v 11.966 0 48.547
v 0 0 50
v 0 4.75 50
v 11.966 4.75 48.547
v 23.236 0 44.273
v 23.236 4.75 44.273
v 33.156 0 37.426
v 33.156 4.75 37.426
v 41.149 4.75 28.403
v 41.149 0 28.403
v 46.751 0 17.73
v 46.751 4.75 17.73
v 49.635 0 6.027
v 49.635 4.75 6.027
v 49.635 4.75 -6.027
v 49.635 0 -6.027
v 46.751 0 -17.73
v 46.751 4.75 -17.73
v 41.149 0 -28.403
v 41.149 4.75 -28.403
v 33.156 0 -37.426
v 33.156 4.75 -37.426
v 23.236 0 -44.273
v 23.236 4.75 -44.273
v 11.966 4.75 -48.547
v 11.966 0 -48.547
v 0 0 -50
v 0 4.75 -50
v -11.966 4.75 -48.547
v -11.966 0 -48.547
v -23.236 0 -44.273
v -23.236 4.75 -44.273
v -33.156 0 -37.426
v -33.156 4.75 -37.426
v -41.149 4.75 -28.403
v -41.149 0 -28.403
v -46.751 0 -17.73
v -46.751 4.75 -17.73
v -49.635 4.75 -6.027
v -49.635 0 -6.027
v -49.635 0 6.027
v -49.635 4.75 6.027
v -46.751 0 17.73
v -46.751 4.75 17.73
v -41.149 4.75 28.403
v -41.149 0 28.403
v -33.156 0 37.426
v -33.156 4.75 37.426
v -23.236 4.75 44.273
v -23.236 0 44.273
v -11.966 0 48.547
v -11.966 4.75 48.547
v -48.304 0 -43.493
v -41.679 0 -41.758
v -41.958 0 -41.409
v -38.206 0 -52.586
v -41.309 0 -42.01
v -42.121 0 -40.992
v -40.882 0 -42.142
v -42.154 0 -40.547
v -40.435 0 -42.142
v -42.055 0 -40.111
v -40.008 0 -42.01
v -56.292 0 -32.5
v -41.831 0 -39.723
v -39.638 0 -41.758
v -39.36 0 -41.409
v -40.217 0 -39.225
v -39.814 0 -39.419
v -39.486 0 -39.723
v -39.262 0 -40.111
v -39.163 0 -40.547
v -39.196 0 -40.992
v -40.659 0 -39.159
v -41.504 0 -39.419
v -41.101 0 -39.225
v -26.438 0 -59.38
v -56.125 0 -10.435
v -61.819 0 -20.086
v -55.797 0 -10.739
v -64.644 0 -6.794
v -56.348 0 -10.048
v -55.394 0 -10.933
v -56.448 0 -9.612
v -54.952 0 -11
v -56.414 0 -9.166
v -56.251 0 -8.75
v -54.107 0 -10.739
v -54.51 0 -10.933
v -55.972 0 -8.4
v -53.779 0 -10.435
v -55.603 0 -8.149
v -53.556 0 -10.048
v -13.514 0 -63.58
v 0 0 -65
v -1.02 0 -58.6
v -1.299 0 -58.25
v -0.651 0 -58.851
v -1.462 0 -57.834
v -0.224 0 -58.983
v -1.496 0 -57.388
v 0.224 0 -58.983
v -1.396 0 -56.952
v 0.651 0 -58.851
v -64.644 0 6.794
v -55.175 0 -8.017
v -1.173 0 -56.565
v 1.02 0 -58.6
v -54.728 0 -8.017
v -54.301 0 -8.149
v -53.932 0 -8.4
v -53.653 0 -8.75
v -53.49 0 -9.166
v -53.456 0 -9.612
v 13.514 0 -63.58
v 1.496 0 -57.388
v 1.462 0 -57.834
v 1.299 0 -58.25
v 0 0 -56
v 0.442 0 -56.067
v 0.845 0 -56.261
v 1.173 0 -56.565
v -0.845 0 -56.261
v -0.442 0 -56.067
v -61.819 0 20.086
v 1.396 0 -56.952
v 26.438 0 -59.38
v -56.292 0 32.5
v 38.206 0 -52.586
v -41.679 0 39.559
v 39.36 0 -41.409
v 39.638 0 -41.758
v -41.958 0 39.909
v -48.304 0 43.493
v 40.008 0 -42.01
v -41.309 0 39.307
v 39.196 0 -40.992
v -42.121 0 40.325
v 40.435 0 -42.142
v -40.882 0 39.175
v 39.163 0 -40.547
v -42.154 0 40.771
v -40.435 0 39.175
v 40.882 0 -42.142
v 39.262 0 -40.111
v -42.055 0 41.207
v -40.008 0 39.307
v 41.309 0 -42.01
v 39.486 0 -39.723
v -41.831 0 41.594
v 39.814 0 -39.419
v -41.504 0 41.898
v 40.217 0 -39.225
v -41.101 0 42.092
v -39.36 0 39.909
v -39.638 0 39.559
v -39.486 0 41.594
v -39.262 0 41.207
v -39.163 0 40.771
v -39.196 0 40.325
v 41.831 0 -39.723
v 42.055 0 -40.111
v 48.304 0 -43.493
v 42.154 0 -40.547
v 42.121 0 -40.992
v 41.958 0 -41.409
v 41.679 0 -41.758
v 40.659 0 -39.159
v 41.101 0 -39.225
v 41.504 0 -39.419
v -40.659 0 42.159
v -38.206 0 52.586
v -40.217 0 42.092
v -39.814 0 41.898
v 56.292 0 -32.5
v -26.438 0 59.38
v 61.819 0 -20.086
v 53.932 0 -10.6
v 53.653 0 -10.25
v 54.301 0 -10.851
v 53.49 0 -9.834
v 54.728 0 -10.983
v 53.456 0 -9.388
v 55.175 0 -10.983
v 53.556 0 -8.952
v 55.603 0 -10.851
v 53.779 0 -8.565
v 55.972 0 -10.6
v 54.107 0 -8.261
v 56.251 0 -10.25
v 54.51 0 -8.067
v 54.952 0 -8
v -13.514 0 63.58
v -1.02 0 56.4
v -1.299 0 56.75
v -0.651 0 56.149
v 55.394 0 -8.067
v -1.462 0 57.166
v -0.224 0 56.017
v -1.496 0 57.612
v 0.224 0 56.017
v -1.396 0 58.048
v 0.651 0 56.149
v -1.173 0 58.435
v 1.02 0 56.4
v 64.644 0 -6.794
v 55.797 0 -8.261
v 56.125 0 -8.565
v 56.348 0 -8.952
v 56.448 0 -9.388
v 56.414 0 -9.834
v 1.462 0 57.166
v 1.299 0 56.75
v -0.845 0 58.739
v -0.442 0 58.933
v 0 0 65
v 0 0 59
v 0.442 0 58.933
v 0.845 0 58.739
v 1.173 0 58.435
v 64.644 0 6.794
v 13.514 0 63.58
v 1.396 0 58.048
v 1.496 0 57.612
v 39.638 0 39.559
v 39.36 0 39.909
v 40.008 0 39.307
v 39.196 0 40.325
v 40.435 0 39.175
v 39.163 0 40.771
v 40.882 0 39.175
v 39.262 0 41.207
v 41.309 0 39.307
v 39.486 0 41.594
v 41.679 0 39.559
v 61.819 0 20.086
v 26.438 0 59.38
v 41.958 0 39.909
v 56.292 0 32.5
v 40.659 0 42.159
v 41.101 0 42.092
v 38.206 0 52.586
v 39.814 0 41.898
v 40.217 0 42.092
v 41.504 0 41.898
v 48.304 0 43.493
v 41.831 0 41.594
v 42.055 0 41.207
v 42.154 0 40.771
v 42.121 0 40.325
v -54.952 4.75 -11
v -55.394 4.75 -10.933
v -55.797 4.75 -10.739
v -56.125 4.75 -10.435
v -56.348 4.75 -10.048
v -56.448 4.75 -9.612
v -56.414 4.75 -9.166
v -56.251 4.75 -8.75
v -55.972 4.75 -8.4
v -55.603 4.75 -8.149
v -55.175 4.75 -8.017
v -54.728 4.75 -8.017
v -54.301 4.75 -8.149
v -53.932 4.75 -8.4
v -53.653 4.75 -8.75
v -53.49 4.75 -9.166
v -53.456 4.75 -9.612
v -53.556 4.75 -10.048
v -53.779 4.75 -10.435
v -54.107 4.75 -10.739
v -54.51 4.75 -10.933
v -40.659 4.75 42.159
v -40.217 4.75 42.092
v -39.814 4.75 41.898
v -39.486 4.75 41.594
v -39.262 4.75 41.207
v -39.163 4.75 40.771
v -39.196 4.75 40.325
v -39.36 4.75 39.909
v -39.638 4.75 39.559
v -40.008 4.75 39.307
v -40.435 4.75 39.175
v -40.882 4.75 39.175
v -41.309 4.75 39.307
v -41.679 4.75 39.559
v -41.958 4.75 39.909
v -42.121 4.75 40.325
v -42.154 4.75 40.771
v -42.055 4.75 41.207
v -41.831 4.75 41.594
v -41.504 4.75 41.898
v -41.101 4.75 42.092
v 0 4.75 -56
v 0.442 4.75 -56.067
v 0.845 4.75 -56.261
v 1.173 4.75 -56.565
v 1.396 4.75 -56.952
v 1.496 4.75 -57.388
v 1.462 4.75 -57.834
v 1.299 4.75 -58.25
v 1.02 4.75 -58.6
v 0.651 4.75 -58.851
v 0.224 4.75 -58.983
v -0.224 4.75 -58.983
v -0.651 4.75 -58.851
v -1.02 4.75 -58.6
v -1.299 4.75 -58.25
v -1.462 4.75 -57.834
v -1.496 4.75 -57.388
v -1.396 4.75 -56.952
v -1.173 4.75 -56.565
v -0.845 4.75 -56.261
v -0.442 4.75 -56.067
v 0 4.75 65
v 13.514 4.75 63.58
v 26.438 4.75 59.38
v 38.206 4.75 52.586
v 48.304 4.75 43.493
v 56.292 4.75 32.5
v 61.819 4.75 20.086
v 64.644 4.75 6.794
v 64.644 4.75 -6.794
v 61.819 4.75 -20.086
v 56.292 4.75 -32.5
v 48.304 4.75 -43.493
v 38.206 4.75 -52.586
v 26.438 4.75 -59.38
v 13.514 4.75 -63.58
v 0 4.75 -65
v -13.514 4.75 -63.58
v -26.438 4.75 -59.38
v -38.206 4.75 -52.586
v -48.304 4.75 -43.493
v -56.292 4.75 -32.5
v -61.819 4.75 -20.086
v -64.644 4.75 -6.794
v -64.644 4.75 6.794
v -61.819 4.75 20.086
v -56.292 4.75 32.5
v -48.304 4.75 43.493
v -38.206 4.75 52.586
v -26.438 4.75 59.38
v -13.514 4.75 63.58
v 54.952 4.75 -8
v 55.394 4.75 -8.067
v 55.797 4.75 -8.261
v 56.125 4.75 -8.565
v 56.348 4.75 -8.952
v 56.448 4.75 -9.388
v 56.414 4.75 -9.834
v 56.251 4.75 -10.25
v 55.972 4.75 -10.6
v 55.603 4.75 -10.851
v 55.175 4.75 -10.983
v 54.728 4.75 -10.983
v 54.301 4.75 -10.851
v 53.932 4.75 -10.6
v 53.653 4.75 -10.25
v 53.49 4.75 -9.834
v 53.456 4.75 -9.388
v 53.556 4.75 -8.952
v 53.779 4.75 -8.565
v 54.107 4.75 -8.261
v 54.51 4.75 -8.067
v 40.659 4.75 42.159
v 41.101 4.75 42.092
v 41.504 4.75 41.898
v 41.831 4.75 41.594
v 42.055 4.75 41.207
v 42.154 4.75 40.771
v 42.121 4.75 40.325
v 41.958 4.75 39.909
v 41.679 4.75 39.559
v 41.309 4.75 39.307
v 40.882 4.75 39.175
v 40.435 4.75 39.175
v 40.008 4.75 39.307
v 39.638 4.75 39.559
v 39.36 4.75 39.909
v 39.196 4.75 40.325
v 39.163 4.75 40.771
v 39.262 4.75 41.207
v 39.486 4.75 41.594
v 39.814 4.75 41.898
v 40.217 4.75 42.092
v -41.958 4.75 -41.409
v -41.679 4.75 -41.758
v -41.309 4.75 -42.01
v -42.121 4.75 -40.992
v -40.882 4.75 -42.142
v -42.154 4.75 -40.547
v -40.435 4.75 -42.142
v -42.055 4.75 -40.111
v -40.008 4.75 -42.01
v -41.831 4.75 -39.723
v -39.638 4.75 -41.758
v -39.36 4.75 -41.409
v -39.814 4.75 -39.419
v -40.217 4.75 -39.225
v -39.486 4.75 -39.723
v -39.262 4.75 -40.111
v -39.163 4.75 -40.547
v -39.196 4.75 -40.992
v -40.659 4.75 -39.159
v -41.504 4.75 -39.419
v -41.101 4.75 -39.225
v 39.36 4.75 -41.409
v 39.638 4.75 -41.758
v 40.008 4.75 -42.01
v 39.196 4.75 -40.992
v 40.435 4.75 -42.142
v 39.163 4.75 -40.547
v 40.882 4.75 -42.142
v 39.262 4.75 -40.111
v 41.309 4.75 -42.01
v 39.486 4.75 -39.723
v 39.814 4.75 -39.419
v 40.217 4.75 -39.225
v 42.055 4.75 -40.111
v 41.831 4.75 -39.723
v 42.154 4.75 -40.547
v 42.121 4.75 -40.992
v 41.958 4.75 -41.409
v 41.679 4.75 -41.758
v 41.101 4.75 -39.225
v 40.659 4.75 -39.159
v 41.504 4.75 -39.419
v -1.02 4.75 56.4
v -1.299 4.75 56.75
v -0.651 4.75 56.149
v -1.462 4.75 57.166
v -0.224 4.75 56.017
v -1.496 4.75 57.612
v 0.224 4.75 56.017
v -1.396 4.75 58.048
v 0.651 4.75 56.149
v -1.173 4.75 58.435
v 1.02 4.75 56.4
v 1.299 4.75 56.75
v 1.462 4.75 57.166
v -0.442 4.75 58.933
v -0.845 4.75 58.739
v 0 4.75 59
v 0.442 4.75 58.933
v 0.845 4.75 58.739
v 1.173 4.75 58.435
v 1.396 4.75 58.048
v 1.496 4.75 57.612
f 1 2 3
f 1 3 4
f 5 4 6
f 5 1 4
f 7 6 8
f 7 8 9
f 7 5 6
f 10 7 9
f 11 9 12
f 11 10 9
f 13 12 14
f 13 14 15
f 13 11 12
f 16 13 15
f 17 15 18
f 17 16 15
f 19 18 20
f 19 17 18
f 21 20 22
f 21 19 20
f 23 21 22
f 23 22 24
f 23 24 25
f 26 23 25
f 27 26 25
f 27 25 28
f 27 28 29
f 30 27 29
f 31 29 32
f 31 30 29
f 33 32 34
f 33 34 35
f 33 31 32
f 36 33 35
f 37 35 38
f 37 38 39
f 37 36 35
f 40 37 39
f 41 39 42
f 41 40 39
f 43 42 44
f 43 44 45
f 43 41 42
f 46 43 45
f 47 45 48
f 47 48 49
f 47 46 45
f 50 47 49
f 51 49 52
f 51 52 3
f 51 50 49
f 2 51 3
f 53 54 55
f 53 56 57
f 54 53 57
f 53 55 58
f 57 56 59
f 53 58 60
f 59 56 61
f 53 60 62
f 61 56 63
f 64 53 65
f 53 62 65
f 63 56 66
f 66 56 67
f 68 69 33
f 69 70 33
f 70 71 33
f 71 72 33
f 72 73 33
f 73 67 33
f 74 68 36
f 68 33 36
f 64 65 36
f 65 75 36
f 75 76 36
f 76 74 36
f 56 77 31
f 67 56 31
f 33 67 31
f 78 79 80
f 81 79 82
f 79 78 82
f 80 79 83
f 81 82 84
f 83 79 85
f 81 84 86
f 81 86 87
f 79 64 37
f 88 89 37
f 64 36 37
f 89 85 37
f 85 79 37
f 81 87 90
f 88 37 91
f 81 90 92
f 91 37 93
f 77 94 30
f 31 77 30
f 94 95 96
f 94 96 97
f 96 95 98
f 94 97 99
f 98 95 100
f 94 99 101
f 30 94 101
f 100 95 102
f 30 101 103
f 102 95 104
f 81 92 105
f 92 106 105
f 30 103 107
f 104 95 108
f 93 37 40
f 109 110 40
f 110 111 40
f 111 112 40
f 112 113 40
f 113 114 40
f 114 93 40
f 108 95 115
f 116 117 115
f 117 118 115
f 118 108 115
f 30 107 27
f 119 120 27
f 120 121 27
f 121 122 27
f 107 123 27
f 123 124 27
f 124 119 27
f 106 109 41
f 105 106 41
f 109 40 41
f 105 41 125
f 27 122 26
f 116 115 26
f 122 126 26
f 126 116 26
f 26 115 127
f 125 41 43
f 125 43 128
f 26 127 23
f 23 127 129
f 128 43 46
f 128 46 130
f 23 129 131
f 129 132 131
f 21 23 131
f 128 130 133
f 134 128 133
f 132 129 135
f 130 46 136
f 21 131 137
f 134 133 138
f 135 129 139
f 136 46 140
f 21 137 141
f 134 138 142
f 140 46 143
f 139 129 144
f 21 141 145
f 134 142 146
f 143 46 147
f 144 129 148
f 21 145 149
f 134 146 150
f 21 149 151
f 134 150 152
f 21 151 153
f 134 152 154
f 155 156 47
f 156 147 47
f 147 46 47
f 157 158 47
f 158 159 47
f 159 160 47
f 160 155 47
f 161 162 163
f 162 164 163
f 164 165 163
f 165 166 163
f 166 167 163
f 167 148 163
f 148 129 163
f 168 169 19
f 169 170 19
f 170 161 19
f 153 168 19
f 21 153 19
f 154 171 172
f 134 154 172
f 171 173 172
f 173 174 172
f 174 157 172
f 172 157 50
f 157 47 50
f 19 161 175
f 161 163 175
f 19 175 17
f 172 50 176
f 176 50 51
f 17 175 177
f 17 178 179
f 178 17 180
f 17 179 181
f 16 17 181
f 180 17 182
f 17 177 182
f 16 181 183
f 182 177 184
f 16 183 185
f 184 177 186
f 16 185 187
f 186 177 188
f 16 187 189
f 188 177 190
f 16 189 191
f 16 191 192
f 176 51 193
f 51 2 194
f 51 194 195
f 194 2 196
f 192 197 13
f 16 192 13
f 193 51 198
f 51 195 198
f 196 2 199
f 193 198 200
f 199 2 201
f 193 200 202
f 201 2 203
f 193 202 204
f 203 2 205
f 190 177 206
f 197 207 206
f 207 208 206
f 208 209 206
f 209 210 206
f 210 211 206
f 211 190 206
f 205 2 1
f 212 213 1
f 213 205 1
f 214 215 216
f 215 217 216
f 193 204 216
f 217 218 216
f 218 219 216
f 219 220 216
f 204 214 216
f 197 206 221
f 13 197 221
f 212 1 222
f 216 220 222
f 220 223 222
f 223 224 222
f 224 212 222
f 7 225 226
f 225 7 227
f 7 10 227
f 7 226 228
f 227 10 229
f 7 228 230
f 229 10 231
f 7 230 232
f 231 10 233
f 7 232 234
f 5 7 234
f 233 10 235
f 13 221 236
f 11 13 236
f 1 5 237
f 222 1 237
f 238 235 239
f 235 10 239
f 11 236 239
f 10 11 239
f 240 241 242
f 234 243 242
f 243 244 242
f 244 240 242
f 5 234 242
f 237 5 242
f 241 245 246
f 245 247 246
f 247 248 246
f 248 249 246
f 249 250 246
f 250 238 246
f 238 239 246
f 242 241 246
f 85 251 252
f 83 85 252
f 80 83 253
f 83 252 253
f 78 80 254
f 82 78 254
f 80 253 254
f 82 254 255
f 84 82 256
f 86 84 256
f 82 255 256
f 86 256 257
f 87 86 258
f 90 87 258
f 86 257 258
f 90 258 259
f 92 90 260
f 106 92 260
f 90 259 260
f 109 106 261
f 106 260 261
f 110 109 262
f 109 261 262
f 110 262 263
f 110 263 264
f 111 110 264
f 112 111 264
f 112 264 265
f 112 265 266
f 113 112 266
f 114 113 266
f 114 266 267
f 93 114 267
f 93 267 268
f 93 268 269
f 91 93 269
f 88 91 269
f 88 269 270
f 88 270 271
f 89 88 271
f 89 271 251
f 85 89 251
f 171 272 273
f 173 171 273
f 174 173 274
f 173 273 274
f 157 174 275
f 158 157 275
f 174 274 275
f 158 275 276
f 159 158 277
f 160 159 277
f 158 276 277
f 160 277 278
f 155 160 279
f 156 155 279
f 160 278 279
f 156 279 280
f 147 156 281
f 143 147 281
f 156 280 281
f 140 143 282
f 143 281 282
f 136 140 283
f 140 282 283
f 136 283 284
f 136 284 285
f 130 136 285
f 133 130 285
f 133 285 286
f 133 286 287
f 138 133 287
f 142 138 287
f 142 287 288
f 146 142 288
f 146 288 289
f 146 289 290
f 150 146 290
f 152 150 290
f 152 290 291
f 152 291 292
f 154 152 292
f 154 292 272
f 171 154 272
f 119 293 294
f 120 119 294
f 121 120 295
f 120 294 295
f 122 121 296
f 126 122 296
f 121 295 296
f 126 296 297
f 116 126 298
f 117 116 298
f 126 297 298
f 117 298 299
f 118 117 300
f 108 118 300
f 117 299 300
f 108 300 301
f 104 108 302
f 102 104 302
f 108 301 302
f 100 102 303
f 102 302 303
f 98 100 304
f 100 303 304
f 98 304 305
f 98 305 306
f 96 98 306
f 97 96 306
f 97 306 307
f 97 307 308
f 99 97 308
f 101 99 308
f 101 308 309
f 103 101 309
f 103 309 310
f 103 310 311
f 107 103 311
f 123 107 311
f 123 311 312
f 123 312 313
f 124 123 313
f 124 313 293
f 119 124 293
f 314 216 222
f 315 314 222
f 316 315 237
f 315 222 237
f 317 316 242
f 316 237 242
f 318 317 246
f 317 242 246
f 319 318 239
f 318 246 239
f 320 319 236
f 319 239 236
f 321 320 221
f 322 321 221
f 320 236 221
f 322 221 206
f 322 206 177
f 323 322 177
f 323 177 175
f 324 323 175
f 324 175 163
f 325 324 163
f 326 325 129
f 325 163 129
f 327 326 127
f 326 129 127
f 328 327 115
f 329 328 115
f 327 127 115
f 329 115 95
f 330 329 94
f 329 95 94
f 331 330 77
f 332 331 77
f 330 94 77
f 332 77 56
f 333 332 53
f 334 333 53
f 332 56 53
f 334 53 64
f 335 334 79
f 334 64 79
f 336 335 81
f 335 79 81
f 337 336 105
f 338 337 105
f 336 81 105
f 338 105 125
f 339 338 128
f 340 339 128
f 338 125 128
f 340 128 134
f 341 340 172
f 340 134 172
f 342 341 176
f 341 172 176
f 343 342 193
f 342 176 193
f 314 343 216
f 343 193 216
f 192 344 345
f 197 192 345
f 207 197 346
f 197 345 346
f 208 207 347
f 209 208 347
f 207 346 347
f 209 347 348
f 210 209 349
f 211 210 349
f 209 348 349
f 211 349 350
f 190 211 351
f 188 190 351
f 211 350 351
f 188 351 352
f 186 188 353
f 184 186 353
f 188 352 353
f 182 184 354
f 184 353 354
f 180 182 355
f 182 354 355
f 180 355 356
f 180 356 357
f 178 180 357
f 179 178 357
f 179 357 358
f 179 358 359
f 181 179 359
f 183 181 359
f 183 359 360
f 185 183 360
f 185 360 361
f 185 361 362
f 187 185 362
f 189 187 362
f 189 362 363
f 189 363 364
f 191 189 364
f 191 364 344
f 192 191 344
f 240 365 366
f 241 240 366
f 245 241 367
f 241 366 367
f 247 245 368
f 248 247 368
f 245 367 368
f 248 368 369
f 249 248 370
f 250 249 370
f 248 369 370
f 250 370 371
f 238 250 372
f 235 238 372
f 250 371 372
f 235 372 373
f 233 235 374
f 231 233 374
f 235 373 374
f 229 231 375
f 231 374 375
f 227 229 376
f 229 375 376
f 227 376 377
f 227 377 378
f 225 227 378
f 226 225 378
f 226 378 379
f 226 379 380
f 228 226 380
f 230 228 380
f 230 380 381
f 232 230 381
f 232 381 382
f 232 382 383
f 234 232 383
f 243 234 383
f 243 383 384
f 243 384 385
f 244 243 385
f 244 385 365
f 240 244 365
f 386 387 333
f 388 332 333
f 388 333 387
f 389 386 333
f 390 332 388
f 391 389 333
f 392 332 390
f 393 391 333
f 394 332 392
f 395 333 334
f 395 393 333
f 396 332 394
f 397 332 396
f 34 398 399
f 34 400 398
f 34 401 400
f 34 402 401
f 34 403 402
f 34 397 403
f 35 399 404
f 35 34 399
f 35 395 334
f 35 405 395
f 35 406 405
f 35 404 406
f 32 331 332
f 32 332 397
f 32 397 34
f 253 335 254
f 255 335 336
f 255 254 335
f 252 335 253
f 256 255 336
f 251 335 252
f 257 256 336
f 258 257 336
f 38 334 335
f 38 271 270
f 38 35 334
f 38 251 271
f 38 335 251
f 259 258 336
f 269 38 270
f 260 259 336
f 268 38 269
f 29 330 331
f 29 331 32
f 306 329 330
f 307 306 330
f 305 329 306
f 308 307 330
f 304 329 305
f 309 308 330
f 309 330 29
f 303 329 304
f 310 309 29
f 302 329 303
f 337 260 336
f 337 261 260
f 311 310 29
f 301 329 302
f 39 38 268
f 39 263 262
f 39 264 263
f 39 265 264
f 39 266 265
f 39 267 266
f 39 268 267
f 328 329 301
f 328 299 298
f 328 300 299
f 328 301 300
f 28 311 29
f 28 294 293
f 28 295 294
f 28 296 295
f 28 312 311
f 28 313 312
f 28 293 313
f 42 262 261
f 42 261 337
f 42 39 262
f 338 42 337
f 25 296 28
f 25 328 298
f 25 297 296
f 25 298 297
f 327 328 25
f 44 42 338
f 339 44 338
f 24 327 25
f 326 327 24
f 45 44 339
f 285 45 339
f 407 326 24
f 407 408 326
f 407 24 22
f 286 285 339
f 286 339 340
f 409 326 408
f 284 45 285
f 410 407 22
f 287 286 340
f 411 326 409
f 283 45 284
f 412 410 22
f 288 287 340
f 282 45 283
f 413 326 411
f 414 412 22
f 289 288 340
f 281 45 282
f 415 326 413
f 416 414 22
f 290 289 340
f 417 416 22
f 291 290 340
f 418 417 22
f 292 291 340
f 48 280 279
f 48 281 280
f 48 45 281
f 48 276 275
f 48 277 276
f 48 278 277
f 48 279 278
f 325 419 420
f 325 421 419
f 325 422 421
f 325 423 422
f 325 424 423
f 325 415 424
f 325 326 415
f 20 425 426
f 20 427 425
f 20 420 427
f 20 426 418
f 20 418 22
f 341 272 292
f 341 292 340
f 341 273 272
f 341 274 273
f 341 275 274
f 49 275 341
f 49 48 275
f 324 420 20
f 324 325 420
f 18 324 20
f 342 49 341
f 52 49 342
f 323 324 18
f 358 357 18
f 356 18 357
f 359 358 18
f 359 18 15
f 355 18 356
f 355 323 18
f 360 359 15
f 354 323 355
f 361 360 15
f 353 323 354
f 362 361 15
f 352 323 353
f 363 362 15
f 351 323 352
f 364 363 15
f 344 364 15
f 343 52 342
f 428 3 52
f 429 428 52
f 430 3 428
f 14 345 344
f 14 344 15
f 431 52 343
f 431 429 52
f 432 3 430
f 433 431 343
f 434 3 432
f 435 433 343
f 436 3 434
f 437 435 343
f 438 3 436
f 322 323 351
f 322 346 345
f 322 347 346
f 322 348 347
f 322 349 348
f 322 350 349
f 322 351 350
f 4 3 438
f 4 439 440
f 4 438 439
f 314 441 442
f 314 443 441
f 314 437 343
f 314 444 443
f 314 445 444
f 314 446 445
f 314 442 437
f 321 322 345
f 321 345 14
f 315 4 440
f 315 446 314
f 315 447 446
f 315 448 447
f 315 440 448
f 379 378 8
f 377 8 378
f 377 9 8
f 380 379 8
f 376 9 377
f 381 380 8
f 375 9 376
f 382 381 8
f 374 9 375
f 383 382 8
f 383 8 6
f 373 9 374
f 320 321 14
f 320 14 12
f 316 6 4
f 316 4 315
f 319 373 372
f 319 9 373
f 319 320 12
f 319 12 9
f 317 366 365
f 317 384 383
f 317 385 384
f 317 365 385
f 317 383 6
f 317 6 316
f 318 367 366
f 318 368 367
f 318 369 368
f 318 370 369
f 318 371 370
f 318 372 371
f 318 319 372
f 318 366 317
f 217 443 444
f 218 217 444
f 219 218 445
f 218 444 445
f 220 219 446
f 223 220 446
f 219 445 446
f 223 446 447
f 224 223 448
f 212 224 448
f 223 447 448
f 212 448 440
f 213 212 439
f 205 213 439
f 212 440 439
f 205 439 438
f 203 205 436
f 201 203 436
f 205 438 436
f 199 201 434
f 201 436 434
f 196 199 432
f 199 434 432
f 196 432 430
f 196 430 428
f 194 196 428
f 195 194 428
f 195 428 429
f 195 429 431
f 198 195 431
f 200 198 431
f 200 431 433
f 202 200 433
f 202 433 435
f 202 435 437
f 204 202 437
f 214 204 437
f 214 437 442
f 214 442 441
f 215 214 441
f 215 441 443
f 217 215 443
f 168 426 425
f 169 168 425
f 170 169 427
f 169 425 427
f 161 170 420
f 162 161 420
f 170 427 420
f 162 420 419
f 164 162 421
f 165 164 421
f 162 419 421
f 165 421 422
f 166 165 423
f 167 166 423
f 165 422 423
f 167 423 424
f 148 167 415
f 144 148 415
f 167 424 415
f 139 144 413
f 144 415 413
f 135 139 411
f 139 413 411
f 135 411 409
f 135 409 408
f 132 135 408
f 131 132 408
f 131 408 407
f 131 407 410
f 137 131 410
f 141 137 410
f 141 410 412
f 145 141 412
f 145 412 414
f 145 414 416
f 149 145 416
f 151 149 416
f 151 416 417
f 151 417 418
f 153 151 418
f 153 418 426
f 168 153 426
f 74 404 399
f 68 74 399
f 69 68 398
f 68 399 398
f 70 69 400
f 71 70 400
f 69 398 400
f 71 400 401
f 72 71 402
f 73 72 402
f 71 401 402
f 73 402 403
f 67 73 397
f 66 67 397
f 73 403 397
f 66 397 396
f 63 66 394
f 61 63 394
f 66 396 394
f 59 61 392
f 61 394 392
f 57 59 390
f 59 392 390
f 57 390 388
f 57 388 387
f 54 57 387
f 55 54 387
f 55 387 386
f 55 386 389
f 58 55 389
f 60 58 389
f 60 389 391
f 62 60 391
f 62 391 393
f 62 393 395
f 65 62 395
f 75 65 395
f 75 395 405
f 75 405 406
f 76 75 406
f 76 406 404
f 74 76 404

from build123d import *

# Parameters (mm, degrees)
SKETCH1_R           = 65
SKETCH1_R_2         = 50
BOSS_EXTRUDE1_DEPTH = 4.75
SKETCH2_R           = 1.5
CUT_EXTRUDE1_DEPTH  = 5
SKETCH3_R           = 1.5
CUT_EXTRUDE2_DEPTH  = 93.046523563


with BuildPart() as part:
    # Sketch1 → Boss-Extrude1 (new body)
    with BuildSketch(Plane(origin=(0, 0, 0), x_dir=(1, 0, 0), z_dir=(0, 1, 0))):
        Circle(SKETCH1_R)
        Circle(SKETCH1_R_2, mode=Mode.SUBTRACT)
    extrude(amount=BOSS_EXTRUDE1_DEPTH)

    # Sketch2 → Cut-Extrude1 (cut)
    with BuildSketch(Plane(origin=(0, 4.75, 0), x_dir=(1, 0, 0), z_dir=(0, 1, 0))):
        with Locations((40.658639918, 40.658639918)):
            Circle(SKETCH2_R)
        with Locations((40.658639918, -40.658639918)):
            Circle(SKETCH2_R)
        with Locations((0, -57.5)):
            Circle(SKETCH2_R)
        with Locations((-40.658639918, 40.658639918)):
            Circle(SKETCH2_R)
        with Locations((0, 57.5)):
            Circle(SKETCH2_R)
        with Locations((-40.658639918, -40.658639918)):
            Circle(SKETCH2_R)
    extrude(amount=-CUT_EXTRUDE1_DEPTH, mode=Mode.SUBTRACT)

    # Sketch3 → Cut-Extrude2 (cut, through all)
    with BuildSketch(Plane(origin=(0, 4.75, 0), x_dir=(1, 0, 0), z_dir=(0, 1, 0))):
        with Locations((54.951905284, 9.5)):
            Circle(SKETCH3_R)
        with Locations((-54.951905284, 9.5)):
            Circle(SKETCH3_R)
    extrude(amount=-CUT_EXTRUDE2_DEPTH, mode=Mode.SUBTRACT)


solid = part.part
